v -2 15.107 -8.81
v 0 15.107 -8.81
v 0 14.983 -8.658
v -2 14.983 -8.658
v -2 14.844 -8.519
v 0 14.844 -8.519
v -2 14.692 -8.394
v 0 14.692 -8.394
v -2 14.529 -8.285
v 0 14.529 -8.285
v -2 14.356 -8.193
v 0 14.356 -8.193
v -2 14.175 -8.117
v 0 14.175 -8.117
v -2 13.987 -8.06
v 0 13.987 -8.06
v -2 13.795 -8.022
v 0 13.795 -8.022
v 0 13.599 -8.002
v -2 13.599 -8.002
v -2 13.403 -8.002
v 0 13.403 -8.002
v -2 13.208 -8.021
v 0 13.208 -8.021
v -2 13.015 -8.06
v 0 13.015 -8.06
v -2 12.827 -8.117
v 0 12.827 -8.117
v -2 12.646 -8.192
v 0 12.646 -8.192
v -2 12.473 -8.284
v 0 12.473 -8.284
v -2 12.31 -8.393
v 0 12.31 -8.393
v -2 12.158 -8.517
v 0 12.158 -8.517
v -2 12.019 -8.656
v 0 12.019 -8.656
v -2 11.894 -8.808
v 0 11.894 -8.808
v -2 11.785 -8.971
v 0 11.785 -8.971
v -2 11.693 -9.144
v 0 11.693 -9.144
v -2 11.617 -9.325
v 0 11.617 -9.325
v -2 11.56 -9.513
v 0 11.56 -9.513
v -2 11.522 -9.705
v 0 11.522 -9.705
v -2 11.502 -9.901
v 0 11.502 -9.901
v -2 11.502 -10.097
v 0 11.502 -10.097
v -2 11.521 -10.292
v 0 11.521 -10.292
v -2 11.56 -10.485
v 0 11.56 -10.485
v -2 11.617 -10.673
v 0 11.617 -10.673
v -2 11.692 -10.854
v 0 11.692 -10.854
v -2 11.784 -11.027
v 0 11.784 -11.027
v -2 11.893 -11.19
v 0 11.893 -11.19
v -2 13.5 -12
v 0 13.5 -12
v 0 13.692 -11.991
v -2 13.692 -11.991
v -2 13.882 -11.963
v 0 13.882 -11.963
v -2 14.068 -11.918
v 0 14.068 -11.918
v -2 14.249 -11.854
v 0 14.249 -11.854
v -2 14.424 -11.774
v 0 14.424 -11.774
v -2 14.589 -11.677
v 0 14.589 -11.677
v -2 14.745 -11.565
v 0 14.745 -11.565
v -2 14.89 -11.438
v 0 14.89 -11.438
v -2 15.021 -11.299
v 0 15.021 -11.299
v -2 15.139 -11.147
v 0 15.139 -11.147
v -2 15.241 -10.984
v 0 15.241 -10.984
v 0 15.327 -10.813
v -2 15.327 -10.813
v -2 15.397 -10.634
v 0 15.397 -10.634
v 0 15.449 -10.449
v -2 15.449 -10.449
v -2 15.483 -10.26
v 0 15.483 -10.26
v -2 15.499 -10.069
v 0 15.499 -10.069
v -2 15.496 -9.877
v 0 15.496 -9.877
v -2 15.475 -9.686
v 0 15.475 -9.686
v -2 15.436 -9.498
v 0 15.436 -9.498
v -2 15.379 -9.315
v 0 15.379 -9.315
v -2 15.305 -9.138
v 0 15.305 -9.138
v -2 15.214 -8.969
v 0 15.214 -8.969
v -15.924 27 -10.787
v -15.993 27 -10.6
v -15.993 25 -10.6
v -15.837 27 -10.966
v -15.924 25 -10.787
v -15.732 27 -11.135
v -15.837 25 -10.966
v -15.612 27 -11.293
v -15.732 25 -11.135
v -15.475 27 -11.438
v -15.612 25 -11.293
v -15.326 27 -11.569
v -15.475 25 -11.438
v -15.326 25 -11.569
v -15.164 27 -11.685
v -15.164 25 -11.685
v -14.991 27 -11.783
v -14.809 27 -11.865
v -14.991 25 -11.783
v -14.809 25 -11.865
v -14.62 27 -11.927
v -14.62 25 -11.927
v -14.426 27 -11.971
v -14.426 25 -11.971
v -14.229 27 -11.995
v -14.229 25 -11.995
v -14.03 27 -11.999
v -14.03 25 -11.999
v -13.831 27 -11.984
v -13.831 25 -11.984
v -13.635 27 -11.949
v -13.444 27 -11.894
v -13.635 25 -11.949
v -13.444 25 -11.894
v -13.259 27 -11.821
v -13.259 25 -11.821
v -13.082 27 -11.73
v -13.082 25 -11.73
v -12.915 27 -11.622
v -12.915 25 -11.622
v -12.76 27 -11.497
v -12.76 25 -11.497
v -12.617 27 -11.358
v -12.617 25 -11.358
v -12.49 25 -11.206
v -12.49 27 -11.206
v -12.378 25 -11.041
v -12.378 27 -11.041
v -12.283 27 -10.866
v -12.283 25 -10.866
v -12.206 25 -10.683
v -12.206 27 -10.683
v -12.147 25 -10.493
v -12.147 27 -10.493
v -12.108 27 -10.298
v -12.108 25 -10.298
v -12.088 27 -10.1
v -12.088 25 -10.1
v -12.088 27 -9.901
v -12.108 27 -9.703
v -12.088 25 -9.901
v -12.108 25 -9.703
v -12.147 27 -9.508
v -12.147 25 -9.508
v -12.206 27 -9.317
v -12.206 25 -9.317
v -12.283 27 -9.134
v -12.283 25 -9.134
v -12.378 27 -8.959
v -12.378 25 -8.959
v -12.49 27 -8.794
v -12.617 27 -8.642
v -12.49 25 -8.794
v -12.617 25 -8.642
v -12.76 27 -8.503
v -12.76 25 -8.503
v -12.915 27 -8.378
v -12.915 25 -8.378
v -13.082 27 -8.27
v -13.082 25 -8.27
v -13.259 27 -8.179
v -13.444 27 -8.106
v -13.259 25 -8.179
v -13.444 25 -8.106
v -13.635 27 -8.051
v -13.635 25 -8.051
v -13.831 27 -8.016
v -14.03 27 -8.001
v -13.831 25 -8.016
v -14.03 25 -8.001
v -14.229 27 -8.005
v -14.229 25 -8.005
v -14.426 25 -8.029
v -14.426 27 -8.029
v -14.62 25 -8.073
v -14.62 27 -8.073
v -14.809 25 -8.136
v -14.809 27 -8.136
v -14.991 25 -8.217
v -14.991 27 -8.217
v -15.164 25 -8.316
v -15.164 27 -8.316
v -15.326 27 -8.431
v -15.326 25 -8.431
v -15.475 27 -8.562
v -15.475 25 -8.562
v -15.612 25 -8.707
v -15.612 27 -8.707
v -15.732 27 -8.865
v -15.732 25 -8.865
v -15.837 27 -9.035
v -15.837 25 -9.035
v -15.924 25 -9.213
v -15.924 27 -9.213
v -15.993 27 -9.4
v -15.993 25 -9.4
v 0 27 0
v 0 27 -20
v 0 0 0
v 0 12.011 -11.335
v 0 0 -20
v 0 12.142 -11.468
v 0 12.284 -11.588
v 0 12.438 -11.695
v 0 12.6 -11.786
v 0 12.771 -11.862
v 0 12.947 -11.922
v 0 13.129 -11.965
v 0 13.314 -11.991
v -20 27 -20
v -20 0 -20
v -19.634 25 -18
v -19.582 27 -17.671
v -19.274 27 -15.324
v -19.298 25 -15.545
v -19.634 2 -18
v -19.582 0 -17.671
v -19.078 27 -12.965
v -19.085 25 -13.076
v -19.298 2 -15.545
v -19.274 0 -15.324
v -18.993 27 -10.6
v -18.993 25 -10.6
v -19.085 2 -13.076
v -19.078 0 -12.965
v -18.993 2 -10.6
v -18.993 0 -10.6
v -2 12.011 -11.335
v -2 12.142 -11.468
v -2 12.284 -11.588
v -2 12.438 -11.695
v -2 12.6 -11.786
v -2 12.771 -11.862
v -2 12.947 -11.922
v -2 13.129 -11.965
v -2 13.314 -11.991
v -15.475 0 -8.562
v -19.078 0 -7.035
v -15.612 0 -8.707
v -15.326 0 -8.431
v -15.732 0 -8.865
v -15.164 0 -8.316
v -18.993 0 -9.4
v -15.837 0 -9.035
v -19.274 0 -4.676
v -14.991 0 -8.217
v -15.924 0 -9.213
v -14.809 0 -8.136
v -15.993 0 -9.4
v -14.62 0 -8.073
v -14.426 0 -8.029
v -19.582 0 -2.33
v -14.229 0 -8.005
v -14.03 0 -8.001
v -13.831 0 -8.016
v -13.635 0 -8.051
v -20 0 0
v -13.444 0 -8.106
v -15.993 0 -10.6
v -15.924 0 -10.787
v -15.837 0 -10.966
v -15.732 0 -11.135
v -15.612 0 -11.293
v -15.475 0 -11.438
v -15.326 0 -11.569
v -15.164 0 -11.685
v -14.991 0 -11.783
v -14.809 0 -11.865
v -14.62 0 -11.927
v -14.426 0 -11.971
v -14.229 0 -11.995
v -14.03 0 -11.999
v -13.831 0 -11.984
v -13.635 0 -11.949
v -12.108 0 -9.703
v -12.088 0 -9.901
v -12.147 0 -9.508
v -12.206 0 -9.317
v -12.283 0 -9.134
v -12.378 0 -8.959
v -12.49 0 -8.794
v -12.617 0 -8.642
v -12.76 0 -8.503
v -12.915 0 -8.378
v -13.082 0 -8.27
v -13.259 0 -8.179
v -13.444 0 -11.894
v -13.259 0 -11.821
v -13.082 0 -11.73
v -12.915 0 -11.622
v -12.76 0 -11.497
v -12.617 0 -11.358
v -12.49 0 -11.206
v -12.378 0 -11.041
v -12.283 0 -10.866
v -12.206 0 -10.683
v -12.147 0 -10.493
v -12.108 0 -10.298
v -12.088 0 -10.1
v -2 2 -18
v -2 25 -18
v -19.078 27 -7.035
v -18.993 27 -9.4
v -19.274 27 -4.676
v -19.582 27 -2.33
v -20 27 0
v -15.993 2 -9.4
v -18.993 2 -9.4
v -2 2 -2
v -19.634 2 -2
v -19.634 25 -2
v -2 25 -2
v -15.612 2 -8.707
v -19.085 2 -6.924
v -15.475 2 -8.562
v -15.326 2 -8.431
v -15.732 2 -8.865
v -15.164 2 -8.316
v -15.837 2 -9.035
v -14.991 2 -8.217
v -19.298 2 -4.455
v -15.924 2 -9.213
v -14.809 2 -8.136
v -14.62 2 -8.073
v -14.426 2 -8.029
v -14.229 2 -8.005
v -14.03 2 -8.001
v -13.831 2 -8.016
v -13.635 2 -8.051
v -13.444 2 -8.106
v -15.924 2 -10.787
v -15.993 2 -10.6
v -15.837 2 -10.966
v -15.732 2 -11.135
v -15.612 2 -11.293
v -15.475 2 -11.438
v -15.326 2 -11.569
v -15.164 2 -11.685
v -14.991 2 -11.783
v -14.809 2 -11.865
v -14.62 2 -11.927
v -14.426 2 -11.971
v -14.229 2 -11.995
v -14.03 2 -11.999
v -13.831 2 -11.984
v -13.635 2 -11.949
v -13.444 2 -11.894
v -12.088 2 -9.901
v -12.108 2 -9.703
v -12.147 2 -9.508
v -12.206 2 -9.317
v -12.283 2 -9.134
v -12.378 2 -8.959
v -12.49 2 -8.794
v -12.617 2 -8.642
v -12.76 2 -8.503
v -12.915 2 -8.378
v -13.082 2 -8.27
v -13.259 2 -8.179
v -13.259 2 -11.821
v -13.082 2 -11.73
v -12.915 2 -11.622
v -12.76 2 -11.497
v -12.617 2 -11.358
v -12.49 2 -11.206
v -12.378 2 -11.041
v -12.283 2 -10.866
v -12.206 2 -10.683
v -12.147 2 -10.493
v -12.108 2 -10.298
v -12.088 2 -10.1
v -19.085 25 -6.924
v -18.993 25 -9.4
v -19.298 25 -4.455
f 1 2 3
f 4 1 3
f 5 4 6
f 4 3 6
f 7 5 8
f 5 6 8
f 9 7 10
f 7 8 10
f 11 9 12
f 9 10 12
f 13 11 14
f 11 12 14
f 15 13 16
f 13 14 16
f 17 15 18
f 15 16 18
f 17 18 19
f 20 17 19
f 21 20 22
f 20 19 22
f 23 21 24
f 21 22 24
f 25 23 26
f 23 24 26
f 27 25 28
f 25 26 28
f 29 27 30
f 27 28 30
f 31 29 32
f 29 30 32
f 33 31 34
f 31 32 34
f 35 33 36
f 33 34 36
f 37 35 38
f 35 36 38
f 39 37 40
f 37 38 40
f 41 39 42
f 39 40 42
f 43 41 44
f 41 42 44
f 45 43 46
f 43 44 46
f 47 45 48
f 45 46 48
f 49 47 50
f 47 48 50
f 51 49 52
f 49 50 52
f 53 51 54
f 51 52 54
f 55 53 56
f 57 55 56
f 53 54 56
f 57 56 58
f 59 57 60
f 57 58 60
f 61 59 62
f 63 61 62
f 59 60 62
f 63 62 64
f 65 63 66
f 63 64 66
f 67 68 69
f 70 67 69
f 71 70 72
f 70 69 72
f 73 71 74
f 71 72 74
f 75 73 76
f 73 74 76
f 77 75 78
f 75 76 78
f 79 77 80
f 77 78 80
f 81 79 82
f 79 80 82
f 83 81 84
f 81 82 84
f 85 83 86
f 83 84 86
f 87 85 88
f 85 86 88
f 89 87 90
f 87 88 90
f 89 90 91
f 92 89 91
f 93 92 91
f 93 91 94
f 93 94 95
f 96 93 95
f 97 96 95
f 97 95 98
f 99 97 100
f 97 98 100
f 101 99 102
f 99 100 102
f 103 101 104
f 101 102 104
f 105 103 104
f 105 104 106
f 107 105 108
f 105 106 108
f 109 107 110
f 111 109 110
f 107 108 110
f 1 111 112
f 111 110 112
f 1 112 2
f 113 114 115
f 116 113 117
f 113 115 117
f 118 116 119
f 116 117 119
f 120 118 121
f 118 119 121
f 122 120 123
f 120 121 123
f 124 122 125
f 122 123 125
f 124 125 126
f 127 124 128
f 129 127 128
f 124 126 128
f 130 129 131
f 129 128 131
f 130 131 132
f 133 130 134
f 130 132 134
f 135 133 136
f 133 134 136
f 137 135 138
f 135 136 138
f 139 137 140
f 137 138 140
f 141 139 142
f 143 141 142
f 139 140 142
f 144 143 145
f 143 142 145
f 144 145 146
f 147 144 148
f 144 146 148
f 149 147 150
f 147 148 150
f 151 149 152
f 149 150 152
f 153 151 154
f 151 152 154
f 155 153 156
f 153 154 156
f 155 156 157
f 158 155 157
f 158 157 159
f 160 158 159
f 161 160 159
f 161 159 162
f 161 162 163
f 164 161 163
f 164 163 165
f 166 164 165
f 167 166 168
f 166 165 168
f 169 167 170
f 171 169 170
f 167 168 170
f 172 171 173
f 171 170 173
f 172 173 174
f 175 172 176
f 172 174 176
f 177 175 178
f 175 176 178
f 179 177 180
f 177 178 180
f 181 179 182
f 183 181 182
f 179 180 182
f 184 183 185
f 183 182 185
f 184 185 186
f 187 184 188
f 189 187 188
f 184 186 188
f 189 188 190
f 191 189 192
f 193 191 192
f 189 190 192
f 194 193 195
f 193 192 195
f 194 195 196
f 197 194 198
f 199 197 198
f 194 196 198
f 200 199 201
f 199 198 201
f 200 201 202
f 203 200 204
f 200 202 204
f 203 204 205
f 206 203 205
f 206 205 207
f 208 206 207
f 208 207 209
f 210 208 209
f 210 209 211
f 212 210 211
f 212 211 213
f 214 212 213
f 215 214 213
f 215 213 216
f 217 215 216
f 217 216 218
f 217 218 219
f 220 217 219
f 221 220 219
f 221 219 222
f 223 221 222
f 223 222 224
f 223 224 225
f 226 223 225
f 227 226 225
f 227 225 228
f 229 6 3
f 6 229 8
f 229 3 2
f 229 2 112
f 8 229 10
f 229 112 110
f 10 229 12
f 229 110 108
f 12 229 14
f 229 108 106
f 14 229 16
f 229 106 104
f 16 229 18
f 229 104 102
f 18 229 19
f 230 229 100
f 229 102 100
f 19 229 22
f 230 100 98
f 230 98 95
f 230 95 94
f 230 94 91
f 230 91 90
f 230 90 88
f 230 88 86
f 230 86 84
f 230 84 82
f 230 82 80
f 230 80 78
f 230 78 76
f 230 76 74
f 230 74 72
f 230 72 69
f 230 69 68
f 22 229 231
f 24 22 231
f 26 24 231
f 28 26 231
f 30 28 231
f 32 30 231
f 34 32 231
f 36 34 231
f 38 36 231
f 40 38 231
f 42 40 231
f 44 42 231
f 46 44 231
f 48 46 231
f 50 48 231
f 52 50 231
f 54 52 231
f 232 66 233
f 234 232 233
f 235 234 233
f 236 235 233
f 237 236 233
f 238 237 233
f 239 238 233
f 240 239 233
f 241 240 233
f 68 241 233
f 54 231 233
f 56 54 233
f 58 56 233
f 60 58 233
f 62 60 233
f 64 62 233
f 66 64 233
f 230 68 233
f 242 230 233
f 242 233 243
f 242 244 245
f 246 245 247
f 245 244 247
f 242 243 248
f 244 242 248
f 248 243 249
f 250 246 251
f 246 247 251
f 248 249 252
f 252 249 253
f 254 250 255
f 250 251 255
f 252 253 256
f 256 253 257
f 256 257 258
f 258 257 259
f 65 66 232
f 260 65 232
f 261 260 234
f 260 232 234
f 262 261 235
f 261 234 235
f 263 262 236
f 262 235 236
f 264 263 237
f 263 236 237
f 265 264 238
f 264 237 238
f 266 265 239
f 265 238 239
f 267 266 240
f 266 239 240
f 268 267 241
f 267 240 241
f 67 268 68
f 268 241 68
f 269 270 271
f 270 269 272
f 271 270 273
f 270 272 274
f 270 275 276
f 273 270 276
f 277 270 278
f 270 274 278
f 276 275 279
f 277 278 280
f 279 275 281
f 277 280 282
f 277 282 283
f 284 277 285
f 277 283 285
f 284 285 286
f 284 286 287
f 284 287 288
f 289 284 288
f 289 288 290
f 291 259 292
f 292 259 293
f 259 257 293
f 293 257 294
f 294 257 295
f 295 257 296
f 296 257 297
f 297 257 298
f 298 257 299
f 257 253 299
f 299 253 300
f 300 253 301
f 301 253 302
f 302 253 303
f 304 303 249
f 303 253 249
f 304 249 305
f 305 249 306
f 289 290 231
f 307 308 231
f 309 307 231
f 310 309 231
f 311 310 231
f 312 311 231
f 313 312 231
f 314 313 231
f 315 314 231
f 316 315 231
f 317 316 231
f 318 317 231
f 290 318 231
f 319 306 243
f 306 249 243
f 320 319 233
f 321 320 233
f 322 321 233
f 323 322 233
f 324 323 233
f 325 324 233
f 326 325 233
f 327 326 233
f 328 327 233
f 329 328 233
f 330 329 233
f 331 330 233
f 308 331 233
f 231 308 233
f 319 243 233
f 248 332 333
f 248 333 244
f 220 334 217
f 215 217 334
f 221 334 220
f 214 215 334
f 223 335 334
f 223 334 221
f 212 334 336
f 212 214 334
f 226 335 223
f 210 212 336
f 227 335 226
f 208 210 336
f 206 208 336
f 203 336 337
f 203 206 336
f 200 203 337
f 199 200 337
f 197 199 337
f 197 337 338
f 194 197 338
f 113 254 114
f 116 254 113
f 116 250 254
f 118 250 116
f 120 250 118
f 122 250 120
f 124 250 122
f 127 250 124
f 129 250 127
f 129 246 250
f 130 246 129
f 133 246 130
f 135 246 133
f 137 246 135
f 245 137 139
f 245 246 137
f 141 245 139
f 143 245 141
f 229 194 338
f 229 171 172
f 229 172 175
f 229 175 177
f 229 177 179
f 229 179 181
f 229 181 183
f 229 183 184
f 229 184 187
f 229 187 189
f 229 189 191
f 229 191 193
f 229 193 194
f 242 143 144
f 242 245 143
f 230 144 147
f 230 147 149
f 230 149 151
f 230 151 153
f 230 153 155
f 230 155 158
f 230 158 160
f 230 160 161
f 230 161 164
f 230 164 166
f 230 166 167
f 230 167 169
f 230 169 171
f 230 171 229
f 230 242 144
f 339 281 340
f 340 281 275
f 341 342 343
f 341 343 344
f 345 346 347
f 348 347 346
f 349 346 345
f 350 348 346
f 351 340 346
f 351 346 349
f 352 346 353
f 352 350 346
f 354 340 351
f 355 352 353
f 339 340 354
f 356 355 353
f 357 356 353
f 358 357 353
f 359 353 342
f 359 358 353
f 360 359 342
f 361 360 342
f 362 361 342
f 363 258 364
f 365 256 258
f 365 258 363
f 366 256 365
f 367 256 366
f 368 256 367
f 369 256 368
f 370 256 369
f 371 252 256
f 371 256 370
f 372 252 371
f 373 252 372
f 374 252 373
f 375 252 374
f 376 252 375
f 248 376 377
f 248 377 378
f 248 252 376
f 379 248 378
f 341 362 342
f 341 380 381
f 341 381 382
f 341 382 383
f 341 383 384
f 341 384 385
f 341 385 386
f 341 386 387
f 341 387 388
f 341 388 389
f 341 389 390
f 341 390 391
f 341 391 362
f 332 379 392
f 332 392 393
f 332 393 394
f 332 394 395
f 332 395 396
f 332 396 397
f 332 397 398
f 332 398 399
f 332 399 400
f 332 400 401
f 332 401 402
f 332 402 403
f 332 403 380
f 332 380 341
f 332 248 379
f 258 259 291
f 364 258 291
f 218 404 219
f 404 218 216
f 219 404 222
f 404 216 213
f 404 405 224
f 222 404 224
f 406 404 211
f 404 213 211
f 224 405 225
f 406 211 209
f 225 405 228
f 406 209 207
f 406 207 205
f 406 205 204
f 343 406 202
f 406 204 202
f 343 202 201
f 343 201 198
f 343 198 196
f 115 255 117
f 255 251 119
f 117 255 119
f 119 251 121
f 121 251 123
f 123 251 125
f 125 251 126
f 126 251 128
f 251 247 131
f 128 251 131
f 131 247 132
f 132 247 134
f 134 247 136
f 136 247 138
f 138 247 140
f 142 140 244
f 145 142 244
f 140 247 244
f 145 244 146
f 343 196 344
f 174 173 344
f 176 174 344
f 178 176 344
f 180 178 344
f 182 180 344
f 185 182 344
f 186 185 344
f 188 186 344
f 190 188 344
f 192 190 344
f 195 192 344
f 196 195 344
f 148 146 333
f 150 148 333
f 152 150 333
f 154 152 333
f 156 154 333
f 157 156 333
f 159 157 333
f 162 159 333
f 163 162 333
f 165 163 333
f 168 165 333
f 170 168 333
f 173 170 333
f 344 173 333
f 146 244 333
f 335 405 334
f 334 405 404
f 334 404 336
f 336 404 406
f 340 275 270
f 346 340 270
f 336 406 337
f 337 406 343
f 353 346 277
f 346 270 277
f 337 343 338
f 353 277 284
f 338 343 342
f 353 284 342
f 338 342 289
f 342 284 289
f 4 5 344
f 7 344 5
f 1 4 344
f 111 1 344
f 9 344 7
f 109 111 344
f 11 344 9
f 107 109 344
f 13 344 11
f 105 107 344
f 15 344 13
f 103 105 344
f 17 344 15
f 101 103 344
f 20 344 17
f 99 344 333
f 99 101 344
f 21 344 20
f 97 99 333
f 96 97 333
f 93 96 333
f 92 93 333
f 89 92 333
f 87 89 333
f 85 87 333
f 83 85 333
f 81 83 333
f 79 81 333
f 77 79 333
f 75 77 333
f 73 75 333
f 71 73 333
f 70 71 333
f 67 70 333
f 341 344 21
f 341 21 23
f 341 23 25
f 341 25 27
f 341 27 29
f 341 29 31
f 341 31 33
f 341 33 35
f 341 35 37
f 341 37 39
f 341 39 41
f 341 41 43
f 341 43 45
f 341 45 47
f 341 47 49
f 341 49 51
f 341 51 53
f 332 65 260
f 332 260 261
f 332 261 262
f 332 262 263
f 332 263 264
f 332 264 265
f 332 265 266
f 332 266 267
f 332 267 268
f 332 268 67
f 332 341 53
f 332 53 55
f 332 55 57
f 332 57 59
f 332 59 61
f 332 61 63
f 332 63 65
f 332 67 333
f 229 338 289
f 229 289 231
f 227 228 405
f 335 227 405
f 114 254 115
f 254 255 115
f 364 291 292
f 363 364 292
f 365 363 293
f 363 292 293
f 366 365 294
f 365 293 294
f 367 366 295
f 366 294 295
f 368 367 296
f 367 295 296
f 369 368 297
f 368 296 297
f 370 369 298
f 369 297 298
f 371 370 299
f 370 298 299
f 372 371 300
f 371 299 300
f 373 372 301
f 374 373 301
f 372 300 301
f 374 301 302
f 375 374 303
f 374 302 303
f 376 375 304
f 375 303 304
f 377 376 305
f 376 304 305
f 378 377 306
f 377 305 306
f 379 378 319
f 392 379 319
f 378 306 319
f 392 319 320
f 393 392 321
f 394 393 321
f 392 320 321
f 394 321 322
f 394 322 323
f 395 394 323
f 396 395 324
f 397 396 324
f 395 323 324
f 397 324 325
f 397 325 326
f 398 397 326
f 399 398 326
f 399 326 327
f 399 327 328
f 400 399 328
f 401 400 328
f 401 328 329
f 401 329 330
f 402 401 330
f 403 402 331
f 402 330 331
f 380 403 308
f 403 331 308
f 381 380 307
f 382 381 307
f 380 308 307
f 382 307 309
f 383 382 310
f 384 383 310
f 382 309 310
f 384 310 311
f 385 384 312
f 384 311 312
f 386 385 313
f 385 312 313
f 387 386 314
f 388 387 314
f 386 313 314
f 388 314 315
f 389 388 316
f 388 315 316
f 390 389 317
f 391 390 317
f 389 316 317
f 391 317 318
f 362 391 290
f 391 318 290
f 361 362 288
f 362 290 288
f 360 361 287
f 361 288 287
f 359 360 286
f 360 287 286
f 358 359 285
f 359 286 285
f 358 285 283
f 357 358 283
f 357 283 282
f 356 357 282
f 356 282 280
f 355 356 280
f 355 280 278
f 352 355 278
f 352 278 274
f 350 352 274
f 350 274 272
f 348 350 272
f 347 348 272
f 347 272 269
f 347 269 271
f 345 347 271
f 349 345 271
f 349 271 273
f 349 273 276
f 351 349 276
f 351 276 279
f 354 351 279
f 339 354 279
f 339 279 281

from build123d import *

# Parameters (mm, degrees)
BOSS_EXTRUDE1_DEPTH = 27
SHELL3_T            = -2
CUT_EXTRUDE1_DEPTH  = 2


with BuildPart() as part:
    # Sketch2 → Boss-Extrude1 (new body)
    with BuildSketch(Plane(origin=(0, 0, 0), x_dir=(1, 0, 0), z_dir=(0, 1, 0))):
        with BuildLine():
            Line((-18.993396104, 10.600093214), (-15.993396104, 10.600093214))
            ThreePointArc((-15.993396104, 10.600093214), (-12.085516583, 10.0001005), (-15.993393867, 9.400093214))
            Line((-15.993393867, 9.400093214), (-18.993393867, 9.400093214))
            ThreePointArc((-18.993393867, 9.400093214), (-19.274030957, 4.676202489), (-20, 0))
            Line((-20, 0), (0, 0))
            Line((0, 0), (0, 20))
            Line((0, 20), (-20, 20))
            ThreePointArc((-20, 20), (-19.274040883, 15.323890203), (-18.993396104, 10.600093214))
        make_face()
    extrude(amount=BOSS_EXTRUDE1_DEPTH)

    # Shell3
    shell3_openings = [part.faces().sort_by_distance(p)[0] for p in [
        (-19.274030957, 13.5, -4.676202489),
        (-17.493393867, 13.5, -9.400093214),
        (-12.085516583, 13.5, -10.0001005),
        (-17.493396104, 13.5, -10.600093214),
        (-19.274040883, 13.5, -15.323890203),
    ]]
    offset(amount=SHELL3_T, openings=shell3_openings, kind=Kind.INTERSECTION)

    # Sketch3 → Cut-Extrude1 (cut)
    with BuildSketch(Plane(origin=(0, 0, 0), x_dir=(0, 0, -1), z_dir=(1, 0, 0))):
        with BuildLine():
            ThreePointArc((12, 13.5), (10.89974713, 15.286184509), (8.809544899, 15.107114387))
            Line((8.809544899, 15.107114387), (11.190455101, 11.892885613))
            ThreePointArc((11.190455101, 11.892885613), (11.786184509, 12.60025287), (12, 13.5))
        make_face()
        with BuildLine():
            Line((11.190455101, 11.892885613), (8.809544899, 15.107114387))
            ThreePointArc((8.809544899, 15.107114387), (8.392885613, 12.309544899), (11.190455101, 11.892885613))
        make_face()
    extrude(amount=-CUT_EXTRUDE1_DEPTH, mode=Mode.SUBTRACT)


solid = part.part
